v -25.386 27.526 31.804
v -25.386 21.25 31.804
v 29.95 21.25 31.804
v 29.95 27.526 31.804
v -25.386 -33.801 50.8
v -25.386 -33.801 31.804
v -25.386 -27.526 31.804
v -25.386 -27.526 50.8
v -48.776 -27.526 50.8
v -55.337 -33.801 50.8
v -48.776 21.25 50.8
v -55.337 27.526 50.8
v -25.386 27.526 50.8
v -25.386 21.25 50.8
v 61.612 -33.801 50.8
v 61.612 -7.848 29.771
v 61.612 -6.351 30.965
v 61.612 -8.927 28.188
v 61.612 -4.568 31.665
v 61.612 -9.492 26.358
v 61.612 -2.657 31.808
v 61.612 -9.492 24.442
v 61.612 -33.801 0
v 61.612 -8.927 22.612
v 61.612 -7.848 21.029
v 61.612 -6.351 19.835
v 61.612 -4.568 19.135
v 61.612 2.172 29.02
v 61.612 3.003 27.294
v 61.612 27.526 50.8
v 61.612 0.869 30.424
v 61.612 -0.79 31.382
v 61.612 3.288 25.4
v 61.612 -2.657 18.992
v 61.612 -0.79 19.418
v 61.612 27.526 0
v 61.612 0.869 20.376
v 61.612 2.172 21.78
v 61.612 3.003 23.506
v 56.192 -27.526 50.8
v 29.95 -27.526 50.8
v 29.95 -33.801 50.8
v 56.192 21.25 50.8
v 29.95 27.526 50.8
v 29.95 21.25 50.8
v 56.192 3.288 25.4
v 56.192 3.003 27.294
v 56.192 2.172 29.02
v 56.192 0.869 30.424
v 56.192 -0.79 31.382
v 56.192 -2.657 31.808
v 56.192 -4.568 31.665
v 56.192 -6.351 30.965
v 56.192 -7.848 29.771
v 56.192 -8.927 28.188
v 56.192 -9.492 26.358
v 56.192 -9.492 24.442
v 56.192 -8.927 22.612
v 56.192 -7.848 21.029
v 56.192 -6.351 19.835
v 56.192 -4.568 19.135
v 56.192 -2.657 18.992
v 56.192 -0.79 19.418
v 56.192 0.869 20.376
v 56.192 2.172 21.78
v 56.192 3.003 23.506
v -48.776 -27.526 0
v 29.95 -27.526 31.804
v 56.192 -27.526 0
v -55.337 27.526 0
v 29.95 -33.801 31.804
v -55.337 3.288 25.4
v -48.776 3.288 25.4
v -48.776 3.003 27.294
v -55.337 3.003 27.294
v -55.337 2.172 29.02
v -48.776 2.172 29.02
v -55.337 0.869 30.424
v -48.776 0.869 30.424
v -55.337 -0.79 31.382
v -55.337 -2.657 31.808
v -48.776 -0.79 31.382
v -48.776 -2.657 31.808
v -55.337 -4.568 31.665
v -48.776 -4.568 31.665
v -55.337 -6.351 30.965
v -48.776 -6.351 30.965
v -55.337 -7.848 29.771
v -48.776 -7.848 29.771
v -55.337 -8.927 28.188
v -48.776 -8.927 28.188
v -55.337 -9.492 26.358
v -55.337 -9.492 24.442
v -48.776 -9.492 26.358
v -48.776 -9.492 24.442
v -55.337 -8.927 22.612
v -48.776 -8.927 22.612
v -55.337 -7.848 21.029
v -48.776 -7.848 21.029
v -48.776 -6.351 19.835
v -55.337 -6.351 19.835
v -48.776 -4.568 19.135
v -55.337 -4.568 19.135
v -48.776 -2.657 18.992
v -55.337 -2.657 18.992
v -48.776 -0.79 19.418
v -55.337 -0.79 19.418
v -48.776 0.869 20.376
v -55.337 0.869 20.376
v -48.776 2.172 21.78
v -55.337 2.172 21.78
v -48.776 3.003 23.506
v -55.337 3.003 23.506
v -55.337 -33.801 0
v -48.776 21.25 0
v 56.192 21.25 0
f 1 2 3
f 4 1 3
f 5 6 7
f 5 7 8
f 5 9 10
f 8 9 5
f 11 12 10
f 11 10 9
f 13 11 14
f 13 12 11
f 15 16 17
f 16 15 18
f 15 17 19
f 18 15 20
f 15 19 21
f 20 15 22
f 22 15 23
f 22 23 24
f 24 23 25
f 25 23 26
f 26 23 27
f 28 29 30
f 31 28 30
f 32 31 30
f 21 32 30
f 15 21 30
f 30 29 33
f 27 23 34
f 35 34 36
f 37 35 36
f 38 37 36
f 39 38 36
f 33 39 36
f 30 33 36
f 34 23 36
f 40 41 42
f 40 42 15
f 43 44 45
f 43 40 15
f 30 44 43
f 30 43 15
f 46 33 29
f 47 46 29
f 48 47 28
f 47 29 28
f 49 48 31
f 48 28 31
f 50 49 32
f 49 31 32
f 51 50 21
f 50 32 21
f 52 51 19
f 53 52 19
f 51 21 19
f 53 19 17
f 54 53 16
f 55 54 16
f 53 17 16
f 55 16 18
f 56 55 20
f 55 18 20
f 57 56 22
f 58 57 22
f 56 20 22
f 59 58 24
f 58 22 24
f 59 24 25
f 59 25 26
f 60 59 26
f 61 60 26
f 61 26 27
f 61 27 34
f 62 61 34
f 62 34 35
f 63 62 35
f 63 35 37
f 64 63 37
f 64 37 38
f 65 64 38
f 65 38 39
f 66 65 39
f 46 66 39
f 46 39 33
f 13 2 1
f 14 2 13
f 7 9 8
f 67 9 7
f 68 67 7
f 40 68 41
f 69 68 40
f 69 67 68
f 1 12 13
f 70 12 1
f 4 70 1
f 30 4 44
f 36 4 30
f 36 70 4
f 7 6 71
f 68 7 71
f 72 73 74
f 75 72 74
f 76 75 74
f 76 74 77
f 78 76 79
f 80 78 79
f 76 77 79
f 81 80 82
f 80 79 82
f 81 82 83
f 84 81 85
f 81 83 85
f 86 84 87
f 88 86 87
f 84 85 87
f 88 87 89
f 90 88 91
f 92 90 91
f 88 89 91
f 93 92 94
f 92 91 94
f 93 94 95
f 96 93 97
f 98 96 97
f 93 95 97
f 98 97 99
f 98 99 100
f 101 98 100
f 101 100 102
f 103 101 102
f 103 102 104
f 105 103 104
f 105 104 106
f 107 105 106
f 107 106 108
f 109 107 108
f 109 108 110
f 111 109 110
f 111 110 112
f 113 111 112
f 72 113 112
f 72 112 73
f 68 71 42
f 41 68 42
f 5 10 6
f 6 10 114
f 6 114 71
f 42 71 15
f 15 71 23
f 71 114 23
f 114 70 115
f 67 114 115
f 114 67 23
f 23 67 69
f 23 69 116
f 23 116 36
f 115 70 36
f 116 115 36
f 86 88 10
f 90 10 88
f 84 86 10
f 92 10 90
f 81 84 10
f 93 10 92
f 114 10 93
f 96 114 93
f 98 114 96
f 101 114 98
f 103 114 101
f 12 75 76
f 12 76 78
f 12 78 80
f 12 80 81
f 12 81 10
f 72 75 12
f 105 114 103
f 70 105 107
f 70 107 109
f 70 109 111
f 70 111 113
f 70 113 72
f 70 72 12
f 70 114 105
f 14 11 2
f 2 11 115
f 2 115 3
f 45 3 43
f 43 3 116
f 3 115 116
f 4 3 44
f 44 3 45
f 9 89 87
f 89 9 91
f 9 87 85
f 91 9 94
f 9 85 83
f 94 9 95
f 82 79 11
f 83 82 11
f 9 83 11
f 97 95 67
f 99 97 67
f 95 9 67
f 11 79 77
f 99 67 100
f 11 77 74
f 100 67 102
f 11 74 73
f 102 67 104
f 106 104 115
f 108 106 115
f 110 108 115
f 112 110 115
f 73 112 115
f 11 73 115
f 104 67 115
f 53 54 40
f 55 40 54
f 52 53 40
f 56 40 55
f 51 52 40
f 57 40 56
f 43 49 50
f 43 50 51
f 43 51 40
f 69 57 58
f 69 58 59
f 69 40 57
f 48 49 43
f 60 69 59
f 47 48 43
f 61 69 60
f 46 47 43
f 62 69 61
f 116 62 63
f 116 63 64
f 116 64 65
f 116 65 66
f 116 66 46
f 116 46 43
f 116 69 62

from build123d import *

# Parameters (mm, degrees)
F0_W     = 116.948664
F0_H     = 61.326738
F0_W_2   = 104.968556
F0_H_2   = 48.77615
F1_DEPTH = 50.8
F2_W     = 55.336682
F2_H     = 18.995669
F3_DEPTH = 76.2
F4_R     = 6.426074
F5_DEPTH = 177.8


with BuildPart() as f1:
    # F0 (on Top) → F1 (new body)
    with BuildSketch(Plane.XY):
        with Locations((3.137648, -3.137646)):
            Rectangle(F0_W, F0_H)
        with Locations((3.708128, -3.137648)):
            Rectangle(F0_W_2, F0_H_2, mode=Mode.SUBTRACT)
    extrude(amount=F1_DEPTH)

    # F2 (on face) → F3 (cut)
    with BuildSketch(Plane.XZ.offset(33.801015)):
        with Locations((2.281924, 41.302166)):
            Rectangle(F2_W, F2_H)
    extrude(amount=-F3_DEPTH, mode=Mode.SUBTRACT)

    # F4 (on face) → F5 (cut)
    with BuildSketch(Plane.YZ.offset(61.61198)):
        with Locations((-3.137646, 25.4)):
            Circle(F4_R)
    extrude(amount=-F5_DEPTH, mode=Mode.SUBTRACT)


solid = f1.part
